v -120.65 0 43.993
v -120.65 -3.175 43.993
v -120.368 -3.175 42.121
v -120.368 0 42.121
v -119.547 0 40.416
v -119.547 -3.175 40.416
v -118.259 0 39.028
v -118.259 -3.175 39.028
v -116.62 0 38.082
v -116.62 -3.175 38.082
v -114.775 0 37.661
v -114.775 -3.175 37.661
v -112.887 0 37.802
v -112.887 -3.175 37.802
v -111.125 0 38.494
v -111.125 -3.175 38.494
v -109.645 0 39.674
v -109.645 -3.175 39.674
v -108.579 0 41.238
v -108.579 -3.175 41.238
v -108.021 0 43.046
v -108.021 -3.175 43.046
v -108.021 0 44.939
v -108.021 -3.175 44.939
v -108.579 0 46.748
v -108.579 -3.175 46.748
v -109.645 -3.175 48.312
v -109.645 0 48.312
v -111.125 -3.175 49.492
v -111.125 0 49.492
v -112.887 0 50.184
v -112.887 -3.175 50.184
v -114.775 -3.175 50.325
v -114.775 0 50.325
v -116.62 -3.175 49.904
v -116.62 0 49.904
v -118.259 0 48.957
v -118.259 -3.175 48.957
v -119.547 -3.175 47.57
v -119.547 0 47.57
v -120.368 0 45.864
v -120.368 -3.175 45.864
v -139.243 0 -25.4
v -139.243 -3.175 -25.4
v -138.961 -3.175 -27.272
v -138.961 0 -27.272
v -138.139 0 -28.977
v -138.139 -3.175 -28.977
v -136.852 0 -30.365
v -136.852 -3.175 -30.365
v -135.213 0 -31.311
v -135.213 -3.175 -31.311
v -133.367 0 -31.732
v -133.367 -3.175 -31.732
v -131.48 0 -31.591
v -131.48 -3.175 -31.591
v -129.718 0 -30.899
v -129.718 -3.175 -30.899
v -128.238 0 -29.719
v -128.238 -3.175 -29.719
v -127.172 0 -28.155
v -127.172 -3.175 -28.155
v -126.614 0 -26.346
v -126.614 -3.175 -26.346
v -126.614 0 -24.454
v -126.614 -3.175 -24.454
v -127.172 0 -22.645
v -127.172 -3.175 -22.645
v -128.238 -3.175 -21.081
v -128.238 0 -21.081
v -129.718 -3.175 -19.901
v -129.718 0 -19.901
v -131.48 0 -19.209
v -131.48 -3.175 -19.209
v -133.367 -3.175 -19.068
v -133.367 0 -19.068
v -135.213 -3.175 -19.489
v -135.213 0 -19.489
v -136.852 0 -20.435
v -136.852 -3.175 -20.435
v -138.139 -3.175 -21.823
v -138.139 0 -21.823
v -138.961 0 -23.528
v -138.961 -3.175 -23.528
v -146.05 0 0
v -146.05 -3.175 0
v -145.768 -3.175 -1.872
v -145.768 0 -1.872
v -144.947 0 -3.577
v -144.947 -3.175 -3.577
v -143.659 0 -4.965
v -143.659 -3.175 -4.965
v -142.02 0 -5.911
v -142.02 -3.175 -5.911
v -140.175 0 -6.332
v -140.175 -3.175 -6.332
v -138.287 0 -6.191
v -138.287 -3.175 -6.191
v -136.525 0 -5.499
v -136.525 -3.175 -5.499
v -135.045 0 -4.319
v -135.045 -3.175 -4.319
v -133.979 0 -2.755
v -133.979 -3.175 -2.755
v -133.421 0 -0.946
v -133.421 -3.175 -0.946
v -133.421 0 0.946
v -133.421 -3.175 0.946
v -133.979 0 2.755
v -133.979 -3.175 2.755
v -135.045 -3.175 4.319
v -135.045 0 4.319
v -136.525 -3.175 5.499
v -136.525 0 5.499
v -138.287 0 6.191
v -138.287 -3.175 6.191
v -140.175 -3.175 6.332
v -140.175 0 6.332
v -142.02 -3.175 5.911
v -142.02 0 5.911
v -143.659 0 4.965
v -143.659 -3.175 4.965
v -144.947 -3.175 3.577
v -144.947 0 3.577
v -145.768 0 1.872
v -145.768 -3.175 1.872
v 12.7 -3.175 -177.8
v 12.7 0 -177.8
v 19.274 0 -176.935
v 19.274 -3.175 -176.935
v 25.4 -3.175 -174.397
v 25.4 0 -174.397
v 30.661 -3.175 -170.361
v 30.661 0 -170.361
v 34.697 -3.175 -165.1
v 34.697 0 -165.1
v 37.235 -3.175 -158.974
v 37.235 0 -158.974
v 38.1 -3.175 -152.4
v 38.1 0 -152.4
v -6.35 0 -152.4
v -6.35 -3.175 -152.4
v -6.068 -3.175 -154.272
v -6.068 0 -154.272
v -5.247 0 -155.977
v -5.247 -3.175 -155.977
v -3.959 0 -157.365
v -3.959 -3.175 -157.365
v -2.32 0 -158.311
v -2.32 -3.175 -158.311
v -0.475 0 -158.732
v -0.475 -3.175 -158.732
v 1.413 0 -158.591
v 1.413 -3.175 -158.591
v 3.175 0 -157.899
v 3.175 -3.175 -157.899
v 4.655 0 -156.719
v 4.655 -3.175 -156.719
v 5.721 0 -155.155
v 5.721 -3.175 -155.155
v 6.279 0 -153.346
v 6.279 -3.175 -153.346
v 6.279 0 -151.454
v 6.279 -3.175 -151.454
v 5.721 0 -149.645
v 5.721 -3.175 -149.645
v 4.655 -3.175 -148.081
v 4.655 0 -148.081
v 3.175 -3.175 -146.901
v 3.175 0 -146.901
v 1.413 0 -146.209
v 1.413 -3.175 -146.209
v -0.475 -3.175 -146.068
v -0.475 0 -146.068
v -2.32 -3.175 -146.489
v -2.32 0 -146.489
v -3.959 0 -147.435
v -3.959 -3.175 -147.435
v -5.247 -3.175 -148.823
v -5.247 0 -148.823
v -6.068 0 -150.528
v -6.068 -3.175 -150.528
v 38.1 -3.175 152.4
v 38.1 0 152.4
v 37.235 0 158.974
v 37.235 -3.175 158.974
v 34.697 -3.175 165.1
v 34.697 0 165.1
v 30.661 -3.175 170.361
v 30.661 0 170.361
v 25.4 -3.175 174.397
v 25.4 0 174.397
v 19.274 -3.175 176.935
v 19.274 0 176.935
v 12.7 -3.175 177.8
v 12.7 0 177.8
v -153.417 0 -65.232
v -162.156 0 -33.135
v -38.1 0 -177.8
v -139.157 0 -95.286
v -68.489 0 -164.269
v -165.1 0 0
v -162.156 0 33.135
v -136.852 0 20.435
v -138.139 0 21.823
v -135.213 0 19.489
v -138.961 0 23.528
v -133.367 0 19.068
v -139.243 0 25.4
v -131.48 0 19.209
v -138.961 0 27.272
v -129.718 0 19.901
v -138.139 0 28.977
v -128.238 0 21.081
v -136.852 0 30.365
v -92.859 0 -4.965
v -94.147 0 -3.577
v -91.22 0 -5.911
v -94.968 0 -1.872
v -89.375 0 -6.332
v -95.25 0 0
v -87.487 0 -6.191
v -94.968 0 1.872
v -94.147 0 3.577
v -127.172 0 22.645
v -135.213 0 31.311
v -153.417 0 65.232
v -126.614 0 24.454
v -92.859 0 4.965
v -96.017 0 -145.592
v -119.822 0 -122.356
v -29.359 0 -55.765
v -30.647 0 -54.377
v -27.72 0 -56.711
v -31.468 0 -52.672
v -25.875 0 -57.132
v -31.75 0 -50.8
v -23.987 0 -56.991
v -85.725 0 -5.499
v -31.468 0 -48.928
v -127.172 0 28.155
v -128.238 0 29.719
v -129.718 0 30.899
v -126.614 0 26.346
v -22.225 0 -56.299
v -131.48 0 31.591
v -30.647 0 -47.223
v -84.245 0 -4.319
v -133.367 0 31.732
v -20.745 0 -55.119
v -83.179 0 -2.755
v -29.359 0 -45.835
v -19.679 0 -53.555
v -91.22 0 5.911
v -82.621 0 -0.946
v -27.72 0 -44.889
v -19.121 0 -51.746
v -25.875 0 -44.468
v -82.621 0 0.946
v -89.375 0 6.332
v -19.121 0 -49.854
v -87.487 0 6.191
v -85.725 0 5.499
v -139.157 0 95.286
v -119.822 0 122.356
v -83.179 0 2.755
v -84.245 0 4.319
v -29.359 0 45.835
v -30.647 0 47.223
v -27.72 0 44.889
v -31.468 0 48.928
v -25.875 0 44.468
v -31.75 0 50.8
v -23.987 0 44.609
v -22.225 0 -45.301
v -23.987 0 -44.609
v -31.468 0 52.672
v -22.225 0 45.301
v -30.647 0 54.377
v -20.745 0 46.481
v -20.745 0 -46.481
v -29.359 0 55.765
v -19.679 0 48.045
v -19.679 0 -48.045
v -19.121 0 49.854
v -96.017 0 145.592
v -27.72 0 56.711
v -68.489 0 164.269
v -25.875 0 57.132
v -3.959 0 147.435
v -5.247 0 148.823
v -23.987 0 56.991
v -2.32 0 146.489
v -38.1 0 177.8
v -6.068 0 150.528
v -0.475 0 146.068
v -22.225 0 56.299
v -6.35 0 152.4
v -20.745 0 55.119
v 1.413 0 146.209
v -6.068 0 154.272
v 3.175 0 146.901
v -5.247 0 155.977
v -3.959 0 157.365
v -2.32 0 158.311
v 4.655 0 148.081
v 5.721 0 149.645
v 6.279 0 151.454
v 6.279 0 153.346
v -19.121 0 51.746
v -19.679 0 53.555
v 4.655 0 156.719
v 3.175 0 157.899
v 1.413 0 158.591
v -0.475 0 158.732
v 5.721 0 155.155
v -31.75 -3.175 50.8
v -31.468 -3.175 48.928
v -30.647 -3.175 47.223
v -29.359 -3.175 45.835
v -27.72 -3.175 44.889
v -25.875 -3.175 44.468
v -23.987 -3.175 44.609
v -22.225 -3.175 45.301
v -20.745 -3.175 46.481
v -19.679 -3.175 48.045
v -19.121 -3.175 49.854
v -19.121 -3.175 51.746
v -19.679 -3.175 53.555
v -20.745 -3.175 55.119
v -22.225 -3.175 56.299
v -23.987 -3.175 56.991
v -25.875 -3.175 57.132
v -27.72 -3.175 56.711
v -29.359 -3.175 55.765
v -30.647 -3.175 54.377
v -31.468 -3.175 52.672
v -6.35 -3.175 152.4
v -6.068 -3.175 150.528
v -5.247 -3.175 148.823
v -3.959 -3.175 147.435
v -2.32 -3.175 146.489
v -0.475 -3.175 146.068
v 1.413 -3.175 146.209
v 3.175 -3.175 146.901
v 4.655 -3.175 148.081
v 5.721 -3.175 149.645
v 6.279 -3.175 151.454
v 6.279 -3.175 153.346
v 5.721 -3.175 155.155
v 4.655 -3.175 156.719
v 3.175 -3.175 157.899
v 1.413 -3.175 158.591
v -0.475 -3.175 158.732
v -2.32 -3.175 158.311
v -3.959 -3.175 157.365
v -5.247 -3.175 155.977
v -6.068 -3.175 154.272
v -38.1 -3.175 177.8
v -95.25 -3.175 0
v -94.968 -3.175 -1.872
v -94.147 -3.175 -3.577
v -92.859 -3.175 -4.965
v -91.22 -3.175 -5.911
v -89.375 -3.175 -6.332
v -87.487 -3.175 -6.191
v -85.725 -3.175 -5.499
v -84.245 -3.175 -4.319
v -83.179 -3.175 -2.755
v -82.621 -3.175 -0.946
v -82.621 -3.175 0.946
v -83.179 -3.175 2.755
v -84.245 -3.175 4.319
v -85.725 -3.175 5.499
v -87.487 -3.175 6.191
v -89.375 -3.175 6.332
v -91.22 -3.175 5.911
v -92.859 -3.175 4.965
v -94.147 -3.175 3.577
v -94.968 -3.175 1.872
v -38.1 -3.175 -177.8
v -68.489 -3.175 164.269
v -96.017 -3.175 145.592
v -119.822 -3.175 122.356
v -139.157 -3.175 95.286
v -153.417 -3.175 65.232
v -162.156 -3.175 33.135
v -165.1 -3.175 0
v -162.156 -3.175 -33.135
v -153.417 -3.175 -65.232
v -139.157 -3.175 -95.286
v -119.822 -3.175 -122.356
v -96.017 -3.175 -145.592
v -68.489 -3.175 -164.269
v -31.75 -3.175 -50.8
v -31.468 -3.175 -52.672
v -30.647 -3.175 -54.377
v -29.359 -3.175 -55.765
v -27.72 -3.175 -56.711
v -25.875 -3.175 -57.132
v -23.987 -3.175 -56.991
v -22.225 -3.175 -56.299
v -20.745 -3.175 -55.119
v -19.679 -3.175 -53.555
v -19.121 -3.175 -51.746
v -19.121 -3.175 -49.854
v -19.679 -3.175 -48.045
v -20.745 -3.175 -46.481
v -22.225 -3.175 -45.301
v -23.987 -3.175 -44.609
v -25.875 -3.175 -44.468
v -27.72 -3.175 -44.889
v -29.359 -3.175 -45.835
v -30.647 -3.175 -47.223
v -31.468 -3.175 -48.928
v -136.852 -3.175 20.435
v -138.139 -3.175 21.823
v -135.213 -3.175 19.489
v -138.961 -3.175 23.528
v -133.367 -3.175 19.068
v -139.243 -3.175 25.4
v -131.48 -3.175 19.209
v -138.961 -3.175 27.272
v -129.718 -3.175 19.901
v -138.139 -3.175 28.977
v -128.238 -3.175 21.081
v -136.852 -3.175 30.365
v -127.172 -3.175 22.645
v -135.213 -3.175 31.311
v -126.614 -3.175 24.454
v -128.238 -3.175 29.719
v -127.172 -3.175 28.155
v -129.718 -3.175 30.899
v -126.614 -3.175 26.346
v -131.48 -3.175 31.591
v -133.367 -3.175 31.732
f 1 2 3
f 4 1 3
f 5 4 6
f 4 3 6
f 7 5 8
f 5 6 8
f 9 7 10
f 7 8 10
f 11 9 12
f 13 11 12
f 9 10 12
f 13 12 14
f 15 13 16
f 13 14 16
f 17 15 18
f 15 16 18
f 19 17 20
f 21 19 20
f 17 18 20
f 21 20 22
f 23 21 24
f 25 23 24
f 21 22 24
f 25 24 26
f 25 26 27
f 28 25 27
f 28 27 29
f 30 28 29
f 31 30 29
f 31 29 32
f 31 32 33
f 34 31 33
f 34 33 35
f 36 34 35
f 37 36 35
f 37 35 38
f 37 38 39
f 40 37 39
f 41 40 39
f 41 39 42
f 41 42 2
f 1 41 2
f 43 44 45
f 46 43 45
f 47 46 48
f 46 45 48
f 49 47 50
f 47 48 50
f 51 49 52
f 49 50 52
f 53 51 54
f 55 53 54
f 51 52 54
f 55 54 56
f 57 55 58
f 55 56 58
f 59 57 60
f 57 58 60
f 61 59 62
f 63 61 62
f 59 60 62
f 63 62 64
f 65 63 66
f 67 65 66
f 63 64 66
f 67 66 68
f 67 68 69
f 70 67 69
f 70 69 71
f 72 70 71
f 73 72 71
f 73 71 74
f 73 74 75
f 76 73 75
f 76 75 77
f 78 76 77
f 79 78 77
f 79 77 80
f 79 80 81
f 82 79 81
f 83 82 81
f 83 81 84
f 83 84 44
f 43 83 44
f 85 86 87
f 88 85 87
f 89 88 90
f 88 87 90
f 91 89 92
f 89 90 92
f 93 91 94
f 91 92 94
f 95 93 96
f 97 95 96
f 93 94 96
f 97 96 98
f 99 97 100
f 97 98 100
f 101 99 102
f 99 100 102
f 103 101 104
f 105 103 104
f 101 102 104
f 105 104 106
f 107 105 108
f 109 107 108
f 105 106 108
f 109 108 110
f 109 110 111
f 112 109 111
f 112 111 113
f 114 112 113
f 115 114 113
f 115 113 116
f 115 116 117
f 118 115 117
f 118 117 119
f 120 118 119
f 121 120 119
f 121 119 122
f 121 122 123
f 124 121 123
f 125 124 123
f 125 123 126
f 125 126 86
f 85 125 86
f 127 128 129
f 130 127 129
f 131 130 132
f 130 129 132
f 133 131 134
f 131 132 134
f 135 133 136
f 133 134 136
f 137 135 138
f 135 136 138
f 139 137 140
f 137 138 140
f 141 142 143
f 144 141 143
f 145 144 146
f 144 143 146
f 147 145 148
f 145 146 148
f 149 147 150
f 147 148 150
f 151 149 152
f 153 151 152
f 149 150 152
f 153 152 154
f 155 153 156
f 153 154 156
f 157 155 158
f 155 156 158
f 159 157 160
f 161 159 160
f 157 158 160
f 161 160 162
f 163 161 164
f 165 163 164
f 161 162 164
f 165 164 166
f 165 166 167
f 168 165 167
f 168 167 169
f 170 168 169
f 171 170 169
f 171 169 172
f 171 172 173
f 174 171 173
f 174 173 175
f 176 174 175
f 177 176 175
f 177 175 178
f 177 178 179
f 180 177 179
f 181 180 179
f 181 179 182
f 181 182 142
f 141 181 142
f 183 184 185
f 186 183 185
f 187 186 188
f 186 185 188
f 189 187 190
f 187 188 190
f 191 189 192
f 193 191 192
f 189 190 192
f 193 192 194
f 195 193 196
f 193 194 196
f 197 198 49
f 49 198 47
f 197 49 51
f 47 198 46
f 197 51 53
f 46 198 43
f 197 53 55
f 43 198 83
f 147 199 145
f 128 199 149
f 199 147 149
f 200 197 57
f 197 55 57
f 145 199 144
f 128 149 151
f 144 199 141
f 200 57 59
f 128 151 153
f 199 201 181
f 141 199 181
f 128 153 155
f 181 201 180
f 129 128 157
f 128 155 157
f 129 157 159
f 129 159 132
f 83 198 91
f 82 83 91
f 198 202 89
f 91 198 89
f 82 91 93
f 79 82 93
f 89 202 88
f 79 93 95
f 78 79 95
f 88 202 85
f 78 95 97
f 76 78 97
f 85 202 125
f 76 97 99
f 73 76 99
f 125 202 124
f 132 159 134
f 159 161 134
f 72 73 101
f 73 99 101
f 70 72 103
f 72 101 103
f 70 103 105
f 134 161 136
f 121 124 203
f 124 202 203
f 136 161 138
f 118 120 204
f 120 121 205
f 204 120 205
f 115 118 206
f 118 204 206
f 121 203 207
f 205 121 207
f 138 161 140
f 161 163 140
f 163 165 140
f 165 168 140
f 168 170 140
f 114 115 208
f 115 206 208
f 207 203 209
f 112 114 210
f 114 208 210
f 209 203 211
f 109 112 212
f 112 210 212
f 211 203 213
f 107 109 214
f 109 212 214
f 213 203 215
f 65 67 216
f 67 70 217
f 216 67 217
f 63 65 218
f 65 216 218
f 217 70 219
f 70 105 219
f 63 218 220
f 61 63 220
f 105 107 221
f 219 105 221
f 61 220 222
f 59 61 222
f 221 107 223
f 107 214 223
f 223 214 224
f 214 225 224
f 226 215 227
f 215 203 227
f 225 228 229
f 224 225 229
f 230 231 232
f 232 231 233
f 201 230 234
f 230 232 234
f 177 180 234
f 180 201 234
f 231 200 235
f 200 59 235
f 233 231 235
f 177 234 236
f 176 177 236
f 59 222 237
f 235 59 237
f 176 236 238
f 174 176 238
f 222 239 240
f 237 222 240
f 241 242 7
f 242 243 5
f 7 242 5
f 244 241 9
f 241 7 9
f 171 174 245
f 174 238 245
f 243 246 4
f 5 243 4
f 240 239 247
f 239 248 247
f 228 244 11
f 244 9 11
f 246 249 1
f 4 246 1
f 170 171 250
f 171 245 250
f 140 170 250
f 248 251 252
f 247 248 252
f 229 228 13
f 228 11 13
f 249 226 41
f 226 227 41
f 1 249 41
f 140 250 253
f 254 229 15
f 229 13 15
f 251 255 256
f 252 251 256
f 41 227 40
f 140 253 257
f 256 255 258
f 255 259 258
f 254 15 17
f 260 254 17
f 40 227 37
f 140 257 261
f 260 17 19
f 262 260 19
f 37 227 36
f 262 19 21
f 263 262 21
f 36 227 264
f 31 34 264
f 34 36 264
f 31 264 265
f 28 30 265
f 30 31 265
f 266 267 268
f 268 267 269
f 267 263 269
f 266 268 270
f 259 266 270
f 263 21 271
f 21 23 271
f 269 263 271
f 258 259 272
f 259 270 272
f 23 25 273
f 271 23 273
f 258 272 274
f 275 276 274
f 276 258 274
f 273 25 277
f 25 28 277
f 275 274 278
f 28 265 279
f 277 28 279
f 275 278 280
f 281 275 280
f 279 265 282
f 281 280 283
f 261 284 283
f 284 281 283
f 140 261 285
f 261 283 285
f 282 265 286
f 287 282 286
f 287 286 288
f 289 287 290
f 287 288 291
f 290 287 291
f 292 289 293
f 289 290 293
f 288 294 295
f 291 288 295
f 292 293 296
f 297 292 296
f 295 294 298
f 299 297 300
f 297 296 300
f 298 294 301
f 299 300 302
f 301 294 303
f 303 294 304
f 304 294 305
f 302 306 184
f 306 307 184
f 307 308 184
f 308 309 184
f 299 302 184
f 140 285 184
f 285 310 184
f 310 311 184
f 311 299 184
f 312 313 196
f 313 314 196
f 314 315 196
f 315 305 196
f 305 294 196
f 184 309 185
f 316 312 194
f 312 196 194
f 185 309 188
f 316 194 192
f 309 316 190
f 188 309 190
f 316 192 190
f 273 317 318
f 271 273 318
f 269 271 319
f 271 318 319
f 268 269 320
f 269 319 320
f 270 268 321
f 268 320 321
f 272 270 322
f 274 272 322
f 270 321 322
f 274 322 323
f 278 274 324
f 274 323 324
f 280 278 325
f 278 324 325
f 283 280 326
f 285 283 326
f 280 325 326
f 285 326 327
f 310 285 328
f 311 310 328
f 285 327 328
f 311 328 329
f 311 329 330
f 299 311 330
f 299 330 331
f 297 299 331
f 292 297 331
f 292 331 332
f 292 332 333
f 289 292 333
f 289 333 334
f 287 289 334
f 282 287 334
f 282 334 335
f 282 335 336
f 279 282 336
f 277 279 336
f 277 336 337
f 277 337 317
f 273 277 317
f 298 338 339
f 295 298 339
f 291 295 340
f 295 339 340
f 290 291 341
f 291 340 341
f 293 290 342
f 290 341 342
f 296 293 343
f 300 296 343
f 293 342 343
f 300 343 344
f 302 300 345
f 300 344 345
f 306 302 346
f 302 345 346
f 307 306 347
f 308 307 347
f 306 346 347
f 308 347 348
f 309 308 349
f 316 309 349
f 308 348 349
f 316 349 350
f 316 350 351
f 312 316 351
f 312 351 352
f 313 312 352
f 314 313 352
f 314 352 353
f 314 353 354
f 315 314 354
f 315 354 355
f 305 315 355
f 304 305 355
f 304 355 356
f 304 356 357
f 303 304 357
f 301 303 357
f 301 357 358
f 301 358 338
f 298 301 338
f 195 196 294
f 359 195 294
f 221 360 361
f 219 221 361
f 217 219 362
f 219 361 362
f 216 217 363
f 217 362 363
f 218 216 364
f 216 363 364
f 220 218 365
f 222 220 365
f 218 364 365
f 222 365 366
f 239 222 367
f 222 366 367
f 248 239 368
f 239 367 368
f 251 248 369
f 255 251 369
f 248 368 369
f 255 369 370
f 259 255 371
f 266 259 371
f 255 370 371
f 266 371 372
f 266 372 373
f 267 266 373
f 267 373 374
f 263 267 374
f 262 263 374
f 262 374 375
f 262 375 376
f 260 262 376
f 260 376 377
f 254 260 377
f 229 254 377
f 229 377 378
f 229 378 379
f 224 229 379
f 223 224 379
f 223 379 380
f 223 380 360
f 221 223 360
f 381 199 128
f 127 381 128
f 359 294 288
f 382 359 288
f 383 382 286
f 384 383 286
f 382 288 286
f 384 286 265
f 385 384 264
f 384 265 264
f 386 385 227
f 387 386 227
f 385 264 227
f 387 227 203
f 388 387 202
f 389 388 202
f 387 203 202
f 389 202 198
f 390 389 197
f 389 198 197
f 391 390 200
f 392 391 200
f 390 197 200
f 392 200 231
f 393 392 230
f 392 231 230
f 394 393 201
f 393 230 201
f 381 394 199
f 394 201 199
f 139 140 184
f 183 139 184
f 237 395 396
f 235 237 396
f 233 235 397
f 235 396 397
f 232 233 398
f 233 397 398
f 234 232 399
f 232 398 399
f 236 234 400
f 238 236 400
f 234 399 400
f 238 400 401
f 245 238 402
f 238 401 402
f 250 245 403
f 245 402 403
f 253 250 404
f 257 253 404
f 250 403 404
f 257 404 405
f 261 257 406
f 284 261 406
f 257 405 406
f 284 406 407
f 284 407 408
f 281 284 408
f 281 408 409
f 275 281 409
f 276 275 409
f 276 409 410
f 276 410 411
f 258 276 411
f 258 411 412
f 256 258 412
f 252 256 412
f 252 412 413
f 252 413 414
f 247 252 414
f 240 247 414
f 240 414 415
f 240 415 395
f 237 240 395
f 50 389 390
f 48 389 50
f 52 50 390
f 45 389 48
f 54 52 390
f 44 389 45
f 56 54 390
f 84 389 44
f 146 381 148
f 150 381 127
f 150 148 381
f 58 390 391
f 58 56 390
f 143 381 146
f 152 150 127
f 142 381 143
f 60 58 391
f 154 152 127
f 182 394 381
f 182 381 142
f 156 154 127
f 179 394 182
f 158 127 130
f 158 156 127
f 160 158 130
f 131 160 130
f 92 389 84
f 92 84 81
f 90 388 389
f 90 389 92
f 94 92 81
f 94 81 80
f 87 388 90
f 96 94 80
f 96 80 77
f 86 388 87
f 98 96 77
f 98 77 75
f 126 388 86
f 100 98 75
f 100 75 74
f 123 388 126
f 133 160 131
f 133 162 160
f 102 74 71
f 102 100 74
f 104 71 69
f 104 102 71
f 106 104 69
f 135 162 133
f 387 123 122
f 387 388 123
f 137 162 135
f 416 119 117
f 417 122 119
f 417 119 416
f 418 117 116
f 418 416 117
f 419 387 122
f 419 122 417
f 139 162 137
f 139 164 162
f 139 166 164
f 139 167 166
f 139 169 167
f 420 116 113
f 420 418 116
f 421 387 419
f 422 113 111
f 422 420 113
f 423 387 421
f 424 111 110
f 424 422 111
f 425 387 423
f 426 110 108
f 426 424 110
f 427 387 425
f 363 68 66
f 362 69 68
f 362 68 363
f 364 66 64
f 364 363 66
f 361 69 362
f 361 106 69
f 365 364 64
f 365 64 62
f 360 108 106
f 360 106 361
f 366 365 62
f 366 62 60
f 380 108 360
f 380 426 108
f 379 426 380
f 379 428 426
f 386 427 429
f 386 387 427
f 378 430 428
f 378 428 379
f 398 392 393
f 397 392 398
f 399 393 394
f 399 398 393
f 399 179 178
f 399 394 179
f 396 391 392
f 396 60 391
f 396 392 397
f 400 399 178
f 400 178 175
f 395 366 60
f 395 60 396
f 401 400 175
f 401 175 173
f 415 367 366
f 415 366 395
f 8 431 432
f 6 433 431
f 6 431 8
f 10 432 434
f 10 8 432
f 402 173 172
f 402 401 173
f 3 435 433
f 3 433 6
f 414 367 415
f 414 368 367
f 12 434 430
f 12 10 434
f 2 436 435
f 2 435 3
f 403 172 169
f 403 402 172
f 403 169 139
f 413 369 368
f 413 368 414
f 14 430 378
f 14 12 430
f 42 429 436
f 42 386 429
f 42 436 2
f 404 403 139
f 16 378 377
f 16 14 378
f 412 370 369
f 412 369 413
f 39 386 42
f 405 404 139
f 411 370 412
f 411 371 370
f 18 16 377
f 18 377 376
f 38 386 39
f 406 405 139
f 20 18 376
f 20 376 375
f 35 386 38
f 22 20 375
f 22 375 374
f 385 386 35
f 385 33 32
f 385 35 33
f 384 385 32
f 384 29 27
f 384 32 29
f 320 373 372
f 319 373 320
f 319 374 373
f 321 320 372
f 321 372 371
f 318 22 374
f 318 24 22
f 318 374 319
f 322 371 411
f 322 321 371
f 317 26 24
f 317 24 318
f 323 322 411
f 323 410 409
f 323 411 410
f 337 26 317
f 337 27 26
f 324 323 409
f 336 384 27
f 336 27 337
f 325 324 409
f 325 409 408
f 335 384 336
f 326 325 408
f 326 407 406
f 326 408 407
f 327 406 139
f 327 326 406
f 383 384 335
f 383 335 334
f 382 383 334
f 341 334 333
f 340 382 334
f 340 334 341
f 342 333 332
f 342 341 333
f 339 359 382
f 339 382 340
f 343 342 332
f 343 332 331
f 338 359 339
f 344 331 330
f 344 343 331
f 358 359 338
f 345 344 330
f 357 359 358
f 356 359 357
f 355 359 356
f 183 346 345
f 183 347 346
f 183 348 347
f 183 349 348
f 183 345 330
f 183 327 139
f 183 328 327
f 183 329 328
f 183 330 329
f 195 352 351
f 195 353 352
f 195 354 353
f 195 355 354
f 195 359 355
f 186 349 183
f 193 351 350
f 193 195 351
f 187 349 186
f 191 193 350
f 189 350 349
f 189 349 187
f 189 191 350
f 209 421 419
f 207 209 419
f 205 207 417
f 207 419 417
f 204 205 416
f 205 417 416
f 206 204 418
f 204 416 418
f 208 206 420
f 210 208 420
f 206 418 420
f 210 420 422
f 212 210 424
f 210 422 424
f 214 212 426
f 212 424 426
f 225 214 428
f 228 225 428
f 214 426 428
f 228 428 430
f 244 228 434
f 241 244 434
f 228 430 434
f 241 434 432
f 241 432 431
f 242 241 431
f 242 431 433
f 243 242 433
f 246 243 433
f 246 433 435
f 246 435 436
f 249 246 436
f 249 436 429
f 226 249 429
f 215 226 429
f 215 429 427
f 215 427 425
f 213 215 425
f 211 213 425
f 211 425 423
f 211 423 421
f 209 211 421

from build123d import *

# Parameters (mm, degrees)
F0_DEPTH = 3.175
F2_D     = 12.7


with BuildPart() as f0:
    # F1 (on Front) → F0 (new body)
    with BuildSketch(Plane.XZ):
        with BuildLine():
            ThreePointArc((-38.1, 177.8), (-165.1, 0), (-38.1, -177.8))
            Line((-38.1, -177.8), (-38.1, 177.8))
        make_face()
        with BuildLine():
            Line((-38.1, 177.8), (-38.1, -177.8))
            Line((-38.1, -177.8), (12.7, -177.8))
            ThreePointArc((12.7, -177.8), (30.6605122421, -170.3605122421), (38.1, -152.4))
            Line((38.1, -152.4), (38.1, 152.4))
            ThreePointArc((38.1, 152.4), (30.6605122421, 170.3605122421), (12.7, 177.8))
            Line((12.7, 177.8), (-38.1, 177.8))
        make_face()
    extrude(amount=F0_DEPTH)

    # F2 (through all)
    with Locations(Plane(origin=(0, 0, 0), x_dir=(1, 0, 0), z_dir=(0, 1, 0))):
        with Locations((-88.9, 0), (-139.7, 0), (0, 152.4), (0, -152.4), (-132.8928, 25.4), (-132.8928, -25.4), (-114.3, -43.9928), (-25.4, -50.8), (-25.4, 50.8)):
            Hole(F2_D / 2)


solid = f0.part
